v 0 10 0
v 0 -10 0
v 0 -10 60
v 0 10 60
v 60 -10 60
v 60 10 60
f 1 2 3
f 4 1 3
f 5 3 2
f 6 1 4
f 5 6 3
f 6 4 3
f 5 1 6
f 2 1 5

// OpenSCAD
X=1;
Y=1;
Z=1;
echo(version());
cube_size = 20; // [10:Small,20:Medium,30:Large]

hole_diameter = 2.5;
hole_radius = hole_diameter/2;

// How deep should the center hole be?
hole_depth = 1; // [0,1,5,50]

show_wheels = "yes"; // [yes,no]

// How thick should the side wheels be?
wheel_thickness = 1; // [1:20]

// ignore this variable!
// foo=1;

// don't turn functions into params!
function BEZ03(u) = pow((1-u), 3);

// ignore variable values
bing = 3+4;
baz = 3 / hole_depth;

module triangle(scale) {polyhedron(points = [[0, -10, 60], [0, 10, 60], [0, 10, 0], [0, -10, 0], [60, -10, 60], [60, 10, 60]], 
triangles = [[0,3,2], [0,2,1], [3,0,4], [1,2,5], [0,5,4], [0,1,5],  [5,2,4], [4,2,3], ]);}

//resize(newsize=[X,Y,Z]) triangle(1);
scale([X,Y,Z]) triangle(1);

